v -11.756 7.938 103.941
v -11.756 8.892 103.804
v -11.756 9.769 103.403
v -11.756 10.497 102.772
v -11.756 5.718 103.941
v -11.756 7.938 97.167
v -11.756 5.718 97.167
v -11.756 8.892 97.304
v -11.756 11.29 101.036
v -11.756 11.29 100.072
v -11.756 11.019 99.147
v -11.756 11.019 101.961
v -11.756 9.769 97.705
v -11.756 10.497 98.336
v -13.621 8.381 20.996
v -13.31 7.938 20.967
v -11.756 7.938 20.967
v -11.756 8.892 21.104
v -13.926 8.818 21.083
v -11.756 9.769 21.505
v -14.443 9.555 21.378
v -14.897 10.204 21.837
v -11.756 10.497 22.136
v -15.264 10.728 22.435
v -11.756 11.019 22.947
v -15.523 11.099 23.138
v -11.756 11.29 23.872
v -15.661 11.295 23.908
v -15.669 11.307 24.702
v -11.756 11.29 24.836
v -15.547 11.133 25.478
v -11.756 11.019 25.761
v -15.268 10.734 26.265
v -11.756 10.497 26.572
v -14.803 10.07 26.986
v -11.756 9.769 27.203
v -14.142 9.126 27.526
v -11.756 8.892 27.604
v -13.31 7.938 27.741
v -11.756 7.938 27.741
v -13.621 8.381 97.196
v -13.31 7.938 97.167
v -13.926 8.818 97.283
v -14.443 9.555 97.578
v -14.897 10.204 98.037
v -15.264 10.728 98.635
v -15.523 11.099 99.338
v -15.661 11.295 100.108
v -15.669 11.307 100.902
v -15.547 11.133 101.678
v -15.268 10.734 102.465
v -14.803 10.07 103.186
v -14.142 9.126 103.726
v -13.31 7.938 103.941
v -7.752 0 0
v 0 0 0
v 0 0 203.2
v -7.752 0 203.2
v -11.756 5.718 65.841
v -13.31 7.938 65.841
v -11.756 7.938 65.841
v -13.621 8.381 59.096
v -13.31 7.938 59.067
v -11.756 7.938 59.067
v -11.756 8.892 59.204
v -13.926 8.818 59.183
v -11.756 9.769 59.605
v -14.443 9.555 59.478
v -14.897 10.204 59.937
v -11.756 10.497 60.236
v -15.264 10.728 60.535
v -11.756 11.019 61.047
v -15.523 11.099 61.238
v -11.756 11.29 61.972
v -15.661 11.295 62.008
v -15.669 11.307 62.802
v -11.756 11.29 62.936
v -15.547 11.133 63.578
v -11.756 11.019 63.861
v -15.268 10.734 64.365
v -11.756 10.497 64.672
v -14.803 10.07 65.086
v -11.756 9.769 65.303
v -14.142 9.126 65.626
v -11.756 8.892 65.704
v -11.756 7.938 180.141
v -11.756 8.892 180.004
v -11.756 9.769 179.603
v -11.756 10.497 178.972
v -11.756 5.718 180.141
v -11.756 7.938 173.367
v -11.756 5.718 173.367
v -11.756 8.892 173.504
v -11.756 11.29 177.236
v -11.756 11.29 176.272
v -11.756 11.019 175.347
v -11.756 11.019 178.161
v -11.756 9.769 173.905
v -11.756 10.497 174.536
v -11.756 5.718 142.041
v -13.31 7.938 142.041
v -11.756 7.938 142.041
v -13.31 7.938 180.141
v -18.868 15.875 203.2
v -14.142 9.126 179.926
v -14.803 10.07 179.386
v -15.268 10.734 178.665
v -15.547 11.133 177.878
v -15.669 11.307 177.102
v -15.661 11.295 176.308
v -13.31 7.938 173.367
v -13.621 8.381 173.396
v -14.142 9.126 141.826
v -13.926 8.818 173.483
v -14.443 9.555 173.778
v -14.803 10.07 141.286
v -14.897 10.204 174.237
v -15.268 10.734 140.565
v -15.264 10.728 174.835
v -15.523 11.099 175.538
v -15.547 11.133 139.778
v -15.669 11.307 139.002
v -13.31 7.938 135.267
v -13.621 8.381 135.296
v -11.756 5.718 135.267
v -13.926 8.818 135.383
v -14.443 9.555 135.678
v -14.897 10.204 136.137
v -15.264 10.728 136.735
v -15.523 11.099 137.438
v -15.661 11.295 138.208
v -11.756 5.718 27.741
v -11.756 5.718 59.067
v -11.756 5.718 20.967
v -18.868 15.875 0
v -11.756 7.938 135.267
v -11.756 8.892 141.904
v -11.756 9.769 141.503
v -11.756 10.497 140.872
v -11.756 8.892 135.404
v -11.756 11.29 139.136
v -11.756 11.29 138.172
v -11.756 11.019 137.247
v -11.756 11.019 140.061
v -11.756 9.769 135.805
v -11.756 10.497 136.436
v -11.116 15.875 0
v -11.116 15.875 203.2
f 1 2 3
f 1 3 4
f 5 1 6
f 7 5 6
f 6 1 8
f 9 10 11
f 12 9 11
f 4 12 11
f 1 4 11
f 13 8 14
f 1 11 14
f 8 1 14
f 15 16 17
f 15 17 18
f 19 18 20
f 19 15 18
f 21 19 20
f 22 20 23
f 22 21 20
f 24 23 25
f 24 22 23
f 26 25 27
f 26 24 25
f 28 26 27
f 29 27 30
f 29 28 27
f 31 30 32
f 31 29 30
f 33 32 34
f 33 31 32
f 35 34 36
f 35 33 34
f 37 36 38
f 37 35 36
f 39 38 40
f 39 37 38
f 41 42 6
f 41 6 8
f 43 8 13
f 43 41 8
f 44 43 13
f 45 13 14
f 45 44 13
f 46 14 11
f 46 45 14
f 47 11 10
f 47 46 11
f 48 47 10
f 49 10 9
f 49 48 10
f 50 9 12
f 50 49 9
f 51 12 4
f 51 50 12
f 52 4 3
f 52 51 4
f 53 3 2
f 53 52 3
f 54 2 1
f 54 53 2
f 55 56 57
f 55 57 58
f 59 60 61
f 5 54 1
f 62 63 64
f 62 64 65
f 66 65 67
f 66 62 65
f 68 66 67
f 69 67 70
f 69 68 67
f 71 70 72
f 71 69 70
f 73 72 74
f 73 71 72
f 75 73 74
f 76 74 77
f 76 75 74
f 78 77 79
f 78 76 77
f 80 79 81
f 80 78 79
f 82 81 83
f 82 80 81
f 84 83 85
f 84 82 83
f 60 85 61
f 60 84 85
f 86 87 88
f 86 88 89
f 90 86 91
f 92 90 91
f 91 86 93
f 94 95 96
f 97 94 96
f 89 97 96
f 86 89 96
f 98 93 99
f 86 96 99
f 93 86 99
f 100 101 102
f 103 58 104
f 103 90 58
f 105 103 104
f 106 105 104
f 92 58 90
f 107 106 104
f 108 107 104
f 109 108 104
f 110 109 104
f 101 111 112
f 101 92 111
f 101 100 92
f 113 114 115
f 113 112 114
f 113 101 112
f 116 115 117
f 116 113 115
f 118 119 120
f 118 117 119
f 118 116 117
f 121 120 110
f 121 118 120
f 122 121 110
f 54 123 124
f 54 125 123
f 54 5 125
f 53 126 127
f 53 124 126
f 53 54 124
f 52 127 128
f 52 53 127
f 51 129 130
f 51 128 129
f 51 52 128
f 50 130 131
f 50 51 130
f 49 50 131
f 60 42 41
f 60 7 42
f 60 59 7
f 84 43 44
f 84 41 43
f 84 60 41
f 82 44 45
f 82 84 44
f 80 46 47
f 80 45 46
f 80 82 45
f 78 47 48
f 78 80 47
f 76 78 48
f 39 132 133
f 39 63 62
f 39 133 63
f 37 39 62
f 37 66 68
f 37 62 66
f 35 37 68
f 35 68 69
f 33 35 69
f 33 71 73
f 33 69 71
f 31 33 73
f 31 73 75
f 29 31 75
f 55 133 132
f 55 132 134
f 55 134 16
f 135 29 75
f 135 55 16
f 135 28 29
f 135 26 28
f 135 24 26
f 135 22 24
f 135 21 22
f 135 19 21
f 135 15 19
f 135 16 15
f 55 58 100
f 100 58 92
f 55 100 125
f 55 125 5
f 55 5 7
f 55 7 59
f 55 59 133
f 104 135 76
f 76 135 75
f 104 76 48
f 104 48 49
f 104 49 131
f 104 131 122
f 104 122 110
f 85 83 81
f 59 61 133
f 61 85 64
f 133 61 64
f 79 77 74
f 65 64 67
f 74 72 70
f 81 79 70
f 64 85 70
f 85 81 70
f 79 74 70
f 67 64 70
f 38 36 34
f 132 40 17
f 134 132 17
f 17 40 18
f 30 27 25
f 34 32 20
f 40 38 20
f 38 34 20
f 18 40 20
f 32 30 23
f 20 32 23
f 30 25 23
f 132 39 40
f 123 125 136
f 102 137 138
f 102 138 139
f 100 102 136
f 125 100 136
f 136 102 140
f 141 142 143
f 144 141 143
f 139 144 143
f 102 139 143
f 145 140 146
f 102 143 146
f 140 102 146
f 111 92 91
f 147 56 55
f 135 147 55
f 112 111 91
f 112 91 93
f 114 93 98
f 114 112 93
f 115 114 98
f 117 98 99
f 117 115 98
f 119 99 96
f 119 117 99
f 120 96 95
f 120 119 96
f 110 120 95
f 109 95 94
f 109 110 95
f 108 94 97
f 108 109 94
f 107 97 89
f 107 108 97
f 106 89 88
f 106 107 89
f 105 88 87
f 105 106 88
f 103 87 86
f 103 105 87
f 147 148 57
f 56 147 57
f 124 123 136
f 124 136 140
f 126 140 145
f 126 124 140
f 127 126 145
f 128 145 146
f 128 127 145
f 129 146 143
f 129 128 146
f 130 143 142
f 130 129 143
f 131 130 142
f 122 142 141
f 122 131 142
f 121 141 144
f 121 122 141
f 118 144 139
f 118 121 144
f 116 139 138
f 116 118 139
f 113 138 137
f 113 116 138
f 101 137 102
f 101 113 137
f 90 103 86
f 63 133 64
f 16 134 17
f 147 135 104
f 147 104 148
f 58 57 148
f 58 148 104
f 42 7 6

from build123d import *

# Parameters (mm, degrees)
BOSS_EXTRUDE1_DEPTH = 203.2
CUT_EXTRUDE1_DEPTH  = 7.112


with BuildPart() as part:
    # end-profile → Boss-Extrude1 (new body)
    with BuildSketch(Plane.XY):
        Polygon((0, 0), (-7.751918639, 0), (-18.867713308, 15.875), (-11.115794669, 15.875), align=None)
    extrude(amount=BOSS_EXTRUDE1_DEPTH)

    # Sketch4 → Cut-Extrude1 (cut)
    with BuildSketch(Plane(origin=(-18.867713308, 0, 0), x_dir=(0, 0, -1), z_dir=(1, 0, 0))):
        with BuildLine():
            Line((-180.141175267, 7.9375), (-180.141175267, 0))
            Line((-180.141175267, 0), (-173.366995267, 0))
            Line((-173.366995267, 0), (-173.366995267, 7.9375))
            ThreePointArc((-173.366995267, 7.9375), (-176.754085267, 11.32459), (-180.141175267, 7.9375))
        make_face()
        with BuildLine():
            Line((-142.041175267, 7.9375), (-142.041175267, 0))
            Line((-142.041175267, 0), (-135.266995267, 0))
            Line((-135.266995267, 0), (-135.266995267, 7.9375))
            ThreePointArc((-135.266995267, 7.9375), (-138.654085267, 11.32459), (-142.041175267, 7.9375))
        make_face()
        with BuildLine():
            Line((-103.941175267, 7.9375), (-103.941175267, 0))
            Line((-103.941175267, 0), (-97.166995267, 0))
            Line((-97.166995267, 0), (-97.166995267, 7.9375))
            ThreePointArc((-97.166995267, 7.9375), (-100.554085267, 11.32459), (-103.941175267, 7.9375))
        make_face()
        with BuildLine():
            Line((-65.841175267, 7.9375), (-65.841175267, 0))
            Line((-65.841175267, 0), (-59.066995267, 0))
            Line((-59.066995267, 0), (-59.066995267, 7.9375))
            ThreePointArc((-59.066995267, 7.9375), (-62.454085267, 11.32459), (-65.841175267, 7.9375))
        make_face()
        with BuildLine():
            Line((-27.741175267, 7.9375), (-27.741175267, 0))
            Line((-27.741175267, 0), (-20.966995267, 0))
            Line((-20.966995267, 0), (-20.966995267, 7.9375))
            ThreePointArc((-20.966995267, 7.9375), (-24.354085267, 11.32459), (-27.741175267, 7.9375))
        make_face()
    extrude(amount=CUT_EXTRUDE1_DEPTH, mode=Mode.SUBTRACT)


solid = part.part
